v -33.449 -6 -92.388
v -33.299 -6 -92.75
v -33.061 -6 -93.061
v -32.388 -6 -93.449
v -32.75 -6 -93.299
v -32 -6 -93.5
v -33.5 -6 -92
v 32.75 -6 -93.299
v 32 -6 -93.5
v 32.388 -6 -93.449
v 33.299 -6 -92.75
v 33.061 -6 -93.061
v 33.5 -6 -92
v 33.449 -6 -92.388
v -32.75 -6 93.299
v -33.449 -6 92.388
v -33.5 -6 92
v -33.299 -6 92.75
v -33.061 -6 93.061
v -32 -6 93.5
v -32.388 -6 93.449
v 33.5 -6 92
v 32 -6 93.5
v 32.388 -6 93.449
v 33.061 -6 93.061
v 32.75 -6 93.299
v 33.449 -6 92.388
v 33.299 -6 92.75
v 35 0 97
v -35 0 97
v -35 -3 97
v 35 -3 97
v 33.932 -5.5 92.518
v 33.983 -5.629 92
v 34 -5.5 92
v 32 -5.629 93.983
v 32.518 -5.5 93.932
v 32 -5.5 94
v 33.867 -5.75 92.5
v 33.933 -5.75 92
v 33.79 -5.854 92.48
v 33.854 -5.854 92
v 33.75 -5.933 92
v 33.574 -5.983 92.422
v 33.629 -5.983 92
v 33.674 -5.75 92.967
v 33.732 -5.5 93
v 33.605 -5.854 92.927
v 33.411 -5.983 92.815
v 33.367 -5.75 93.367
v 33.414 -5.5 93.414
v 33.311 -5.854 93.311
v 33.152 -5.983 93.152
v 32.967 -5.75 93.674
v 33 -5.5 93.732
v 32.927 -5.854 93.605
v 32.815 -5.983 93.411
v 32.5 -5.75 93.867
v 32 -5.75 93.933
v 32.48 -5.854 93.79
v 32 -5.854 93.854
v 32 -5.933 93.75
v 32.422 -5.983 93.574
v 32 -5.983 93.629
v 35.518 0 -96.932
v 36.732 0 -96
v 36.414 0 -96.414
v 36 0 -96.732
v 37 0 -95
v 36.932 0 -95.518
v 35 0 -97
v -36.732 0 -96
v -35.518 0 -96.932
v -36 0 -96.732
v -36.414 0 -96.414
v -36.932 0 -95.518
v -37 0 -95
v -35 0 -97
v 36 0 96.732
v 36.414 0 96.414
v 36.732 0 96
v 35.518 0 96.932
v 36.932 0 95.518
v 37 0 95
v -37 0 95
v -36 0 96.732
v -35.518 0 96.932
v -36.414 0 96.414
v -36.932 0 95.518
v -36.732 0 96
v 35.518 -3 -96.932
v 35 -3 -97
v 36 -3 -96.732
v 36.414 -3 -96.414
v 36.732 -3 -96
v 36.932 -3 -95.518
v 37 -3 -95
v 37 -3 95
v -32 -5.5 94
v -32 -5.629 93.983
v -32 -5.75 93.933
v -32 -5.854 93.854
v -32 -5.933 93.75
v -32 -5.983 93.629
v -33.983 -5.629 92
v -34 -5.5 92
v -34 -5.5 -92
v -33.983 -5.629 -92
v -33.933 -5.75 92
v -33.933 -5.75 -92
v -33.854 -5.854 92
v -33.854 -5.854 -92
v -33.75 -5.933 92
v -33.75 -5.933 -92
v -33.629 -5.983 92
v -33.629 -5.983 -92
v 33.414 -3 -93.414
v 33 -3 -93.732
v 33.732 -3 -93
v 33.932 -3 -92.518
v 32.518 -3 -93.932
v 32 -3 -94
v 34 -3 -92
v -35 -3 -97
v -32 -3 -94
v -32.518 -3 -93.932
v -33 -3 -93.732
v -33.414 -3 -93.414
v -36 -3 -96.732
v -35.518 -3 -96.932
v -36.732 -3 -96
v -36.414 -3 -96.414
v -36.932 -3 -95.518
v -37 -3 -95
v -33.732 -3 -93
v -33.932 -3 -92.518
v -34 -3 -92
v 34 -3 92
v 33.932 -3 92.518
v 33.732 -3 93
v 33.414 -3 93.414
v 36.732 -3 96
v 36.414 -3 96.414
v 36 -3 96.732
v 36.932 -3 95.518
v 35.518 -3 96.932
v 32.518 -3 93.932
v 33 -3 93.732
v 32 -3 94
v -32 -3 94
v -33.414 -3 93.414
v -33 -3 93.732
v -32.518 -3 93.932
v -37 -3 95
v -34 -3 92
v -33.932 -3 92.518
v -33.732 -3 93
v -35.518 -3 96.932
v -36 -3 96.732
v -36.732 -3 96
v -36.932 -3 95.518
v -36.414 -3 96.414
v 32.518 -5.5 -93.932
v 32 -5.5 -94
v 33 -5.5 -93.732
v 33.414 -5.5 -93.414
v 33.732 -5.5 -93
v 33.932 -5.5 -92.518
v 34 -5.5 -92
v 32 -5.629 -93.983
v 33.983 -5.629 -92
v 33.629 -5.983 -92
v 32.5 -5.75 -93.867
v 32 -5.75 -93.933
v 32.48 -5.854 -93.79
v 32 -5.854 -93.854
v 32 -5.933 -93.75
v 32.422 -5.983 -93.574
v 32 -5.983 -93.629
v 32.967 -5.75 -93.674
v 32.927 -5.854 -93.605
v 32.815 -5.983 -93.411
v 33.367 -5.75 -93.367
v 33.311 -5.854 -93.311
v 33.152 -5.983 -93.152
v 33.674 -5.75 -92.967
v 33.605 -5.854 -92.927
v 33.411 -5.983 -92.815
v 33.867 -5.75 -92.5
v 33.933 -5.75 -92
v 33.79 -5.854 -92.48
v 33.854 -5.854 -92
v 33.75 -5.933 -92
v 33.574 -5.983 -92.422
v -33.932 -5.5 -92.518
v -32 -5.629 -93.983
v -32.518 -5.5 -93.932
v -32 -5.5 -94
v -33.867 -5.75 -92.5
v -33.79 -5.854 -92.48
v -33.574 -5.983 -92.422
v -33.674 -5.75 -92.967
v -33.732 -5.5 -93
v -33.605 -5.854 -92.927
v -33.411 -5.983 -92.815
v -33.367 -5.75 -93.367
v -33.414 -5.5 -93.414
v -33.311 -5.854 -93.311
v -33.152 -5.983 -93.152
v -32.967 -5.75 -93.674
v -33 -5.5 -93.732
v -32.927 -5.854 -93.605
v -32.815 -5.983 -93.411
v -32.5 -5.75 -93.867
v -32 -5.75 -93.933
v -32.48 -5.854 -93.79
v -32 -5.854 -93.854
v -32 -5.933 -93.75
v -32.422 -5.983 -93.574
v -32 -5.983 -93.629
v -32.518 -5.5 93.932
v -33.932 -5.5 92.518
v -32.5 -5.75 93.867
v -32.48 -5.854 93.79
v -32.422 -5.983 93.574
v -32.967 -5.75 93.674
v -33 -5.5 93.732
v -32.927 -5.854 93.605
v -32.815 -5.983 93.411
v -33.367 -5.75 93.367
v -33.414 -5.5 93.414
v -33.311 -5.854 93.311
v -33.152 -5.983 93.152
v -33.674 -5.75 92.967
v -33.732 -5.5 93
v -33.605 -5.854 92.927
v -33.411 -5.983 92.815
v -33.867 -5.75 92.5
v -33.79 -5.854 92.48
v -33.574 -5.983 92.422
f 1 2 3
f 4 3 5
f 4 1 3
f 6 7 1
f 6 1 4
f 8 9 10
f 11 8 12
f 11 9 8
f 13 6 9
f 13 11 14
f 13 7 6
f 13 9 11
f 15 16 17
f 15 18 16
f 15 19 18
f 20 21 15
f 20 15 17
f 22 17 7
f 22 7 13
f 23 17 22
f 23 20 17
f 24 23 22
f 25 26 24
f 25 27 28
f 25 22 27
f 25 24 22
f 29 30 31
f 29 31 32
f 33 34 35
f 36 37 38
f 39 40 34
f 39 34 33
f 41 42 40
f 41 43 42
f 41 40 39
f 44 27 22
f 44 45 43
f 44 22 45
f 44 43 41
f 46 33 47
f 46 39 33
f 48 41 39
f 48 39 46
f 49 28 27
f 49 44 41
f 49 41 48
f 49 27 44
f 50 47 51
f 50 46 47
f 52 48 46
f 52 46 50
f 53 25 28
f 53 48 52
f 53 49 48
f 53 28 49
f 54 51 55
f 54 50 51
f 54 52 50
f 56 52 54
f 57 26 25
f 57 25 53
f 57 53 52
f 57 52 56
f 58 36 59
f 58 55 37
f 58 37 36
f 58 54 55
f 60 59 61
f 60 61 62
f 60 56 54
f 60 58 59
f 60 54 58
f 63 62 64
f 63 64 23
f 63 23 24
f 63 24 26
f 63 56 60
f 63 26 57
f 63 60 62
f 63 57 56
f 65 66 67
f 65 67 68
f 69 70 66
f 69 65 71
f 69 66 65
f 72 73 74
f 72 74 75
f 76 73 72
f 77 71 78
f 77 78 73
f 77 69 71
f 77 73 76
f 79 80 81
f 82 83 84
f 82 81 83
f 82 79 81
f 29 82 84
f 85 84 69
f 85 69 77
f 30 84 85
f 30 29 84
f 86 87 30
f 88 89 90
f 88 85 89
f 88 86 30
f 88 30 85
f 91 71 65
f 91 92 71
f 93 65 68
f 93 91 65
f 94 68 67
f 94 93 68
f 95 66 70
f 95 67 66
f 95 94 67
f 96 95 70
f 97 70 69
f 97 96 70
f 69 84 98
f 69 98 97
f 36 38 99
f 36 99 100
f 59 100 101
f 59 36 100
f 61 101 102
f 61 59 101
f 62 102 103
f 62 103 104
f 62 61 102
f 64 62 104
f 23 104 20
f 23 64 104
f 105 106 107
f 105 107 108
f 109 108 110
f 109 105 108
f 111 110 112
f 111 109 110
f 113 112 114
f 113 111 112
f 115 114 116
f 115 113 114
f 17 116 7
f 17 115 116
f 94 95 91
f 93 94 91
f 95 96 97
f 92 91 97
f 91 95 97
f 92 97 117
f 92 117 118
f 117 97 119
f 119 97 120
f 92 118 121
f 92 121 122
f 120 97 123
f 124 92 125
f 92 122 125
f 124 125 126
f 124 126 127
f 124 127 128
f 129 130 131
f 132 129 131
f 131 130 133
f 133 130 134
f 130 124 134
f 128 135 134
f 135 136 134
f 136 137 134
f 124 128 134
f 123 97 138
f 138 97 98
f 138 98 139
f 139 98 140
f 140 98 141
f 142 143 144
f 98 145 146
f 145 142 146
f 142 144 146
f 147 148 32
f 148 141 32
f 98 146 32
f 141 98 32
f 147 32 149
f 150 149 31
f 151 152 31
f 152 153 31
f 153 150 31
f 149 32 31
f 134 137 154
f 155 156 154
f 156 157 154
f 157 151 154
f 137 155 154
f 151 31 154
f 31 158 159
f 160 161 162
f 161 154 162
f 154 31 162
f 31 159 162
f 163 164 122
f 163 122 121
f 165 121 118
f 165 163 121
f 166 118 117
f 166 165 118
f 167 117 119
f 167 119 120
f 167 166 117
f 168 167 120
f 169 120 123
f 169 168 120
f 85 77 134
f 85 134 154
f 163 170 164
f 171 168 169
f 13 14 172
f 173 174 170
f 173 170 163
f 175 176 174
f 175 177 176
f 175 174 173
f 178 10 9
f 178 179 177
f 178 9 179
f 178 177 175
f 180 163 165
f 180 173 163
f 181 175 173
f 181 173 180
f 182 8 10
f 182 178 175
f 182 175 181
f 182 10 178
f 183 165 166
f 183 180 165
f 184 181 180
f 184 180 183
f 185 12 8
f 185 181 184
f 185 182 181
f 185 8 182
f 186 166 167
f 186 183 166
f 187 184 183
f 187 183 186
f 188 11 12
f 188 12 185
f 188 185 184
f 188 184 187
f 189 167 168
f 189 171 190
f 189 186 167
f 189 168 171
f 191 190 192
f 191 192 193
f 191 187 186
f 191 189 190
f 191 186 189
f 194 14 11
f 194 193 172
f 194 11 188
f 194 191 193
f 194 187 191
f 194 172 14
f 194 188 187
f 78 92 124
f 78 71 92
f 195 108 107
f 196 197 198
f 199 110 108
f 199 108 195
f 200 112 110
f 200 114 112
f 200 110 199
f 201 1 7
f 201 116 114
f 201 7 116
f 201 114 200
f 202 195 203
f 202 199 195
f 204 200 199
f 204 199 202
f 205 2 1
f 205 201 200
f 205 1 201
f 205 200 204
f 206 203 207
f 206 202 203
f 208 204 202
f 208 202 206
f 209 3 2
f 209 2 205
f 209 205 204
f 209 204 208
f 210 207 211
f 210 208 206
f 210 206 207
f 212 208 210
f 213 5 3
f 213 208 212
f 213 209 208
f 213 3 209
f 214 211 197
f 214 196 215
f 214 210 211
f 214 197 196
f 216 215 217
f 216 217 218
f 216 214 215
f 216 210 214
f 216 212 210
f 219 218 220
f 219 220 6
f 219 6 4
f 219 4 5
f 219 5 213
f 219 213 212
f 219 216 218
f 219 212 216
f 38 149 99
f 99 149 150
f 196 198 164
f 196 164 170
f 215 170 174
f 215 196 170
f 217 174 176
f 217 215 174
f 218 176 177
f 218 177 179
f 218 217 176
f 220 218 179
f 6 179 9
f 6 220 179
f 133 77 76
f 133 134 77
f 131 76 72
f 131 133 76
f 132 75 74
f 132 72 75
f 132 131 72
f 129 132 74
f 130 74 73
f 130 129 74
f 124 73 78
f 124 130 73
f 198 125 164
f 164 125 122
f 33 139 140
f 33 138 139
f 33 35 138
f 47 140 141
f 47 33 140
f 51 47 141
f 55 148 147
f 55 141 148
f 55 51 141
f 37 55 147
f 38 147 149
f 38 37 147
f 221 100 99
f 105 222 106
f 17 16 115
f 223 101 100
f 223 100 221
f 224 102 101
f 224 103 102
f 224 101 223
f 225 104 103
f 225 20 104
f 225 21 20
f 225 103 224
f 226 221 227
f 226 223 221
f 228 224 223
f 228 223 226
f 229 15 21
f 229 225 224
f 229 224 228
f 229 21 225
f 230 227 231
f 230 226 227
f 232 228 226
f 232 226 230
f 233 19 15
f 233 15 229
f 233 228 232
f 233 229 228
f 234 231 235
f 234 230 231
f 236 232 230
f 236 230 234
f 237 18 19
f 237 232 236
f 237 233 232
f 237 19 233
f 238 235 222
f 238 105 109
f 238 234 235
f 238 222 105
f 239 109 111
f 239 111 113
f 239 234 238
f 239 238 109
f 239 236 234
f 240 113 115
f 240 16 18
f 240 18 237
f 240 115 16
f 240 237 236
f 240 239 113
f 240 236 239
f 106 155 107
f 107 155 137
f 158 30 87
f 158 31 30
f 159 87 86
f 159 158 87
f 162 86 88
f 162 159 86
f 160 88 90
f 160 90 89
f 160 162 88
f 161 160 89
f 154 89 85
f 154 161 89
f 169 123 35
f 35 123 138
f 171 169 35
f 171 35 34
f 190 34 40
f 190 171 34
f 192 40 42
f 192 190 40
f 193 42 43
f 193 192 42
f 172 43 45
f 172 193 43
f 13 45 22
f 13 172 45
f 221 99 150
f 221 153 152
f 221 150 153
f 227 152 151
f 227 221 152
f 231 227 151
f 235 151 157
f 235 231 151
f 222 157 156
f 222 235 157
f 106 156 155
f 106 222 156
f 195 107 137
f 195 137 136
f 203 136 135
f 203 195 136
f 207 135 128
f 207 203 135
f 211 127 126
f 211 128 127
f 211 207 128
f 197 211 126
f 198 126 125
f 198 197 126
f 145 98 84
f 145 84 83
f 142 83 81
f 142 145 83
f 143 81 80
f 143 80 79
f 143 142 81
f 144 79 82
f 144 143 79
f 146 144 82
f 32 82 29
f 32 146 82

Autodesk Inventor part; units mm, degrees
ref_plane "YZ Plane" through (0, 0, 0) normal (1, 0, 0) x (0, 1, 0)
ref_plane "XZ Plane" through (0, 0, 0) normal (0, 1, 0) x (-1, 0, 0)
ref_plane "XY Plane" through (0, 0, 0) normal (0, 0, 1) x (1, 0, 0)
sketch "Sketch1" plane through (0, 0, 0) normal (0, 1, 0) x (-1, 0, 0)
  line L0 (-37, -97) -> (37, -97)
  line L1 (37, -97) -> (37, 97)
  line L2 (37, 97) -> (-37, 97)
  line L3 (-37, 97) -> (-37, -97)
  line L4 (-37, -97) -> (37, 97) construction
  line L5 (37, -97) -> (-37, 97) construction
  point P0 (0, 0)
  dimension "d0" = 74
  dimension "d1" = 194
extrude "Extrusion1" add sketch "Sketch1" against normal blind 3
sketch "Sketch2" plane through (0, -3, 0) normal (0, -1, 0) x (1, 0, 0)
  line L0 (-37, 97) -> (-37, -97) projected
  line L1 (-37, -97) -> (37, -97) projected
  line L2 (37, -97) -> (37, 97) projected
  line L3 (37, 97) -> (-37, 97) projected
  line L4 (34, 94) -> (-34, 94)
  line L5 (-34, 94) -> (-34, -94)
  line L6 (-34, -94) -> (34, -94)
  line L7 (34, -94) -> (34, 94)
  line L8 (34, 94) -> (-34, -94) construction
  line L9 (-34, 94) -> (34, -94) construction
  point P0 (0, 0)
  dimension "d4" = 3
  dimension "d5" = 3
extrude "Extrusion2" add sketch "Sketch2" along normal blind 3 contours L7 L6 L5 L4
fillet "Fillet1" radius 2 8 edges at (34, -4.5, 94) (-34, -4.5, 94) (37, -1.5, 97) (-37, -1.5, 97) (34, -4.5, -94) (37, -1.5, -97) (-34, -4.5, -94) (-37, -1.5, -97)
fillet "Fillet2" radius 0.5 8 edges at (-33.4142, -6, 93.4142) (-34, -6, 0) (-33.4142, -6, -93.4142) (0, -6, -94) (33.4142, -6, -93.4142) (34, -6, 0) (33.4142, -6, 93.4142) (0, -6, 94)
properties part number "module-lid_command"
